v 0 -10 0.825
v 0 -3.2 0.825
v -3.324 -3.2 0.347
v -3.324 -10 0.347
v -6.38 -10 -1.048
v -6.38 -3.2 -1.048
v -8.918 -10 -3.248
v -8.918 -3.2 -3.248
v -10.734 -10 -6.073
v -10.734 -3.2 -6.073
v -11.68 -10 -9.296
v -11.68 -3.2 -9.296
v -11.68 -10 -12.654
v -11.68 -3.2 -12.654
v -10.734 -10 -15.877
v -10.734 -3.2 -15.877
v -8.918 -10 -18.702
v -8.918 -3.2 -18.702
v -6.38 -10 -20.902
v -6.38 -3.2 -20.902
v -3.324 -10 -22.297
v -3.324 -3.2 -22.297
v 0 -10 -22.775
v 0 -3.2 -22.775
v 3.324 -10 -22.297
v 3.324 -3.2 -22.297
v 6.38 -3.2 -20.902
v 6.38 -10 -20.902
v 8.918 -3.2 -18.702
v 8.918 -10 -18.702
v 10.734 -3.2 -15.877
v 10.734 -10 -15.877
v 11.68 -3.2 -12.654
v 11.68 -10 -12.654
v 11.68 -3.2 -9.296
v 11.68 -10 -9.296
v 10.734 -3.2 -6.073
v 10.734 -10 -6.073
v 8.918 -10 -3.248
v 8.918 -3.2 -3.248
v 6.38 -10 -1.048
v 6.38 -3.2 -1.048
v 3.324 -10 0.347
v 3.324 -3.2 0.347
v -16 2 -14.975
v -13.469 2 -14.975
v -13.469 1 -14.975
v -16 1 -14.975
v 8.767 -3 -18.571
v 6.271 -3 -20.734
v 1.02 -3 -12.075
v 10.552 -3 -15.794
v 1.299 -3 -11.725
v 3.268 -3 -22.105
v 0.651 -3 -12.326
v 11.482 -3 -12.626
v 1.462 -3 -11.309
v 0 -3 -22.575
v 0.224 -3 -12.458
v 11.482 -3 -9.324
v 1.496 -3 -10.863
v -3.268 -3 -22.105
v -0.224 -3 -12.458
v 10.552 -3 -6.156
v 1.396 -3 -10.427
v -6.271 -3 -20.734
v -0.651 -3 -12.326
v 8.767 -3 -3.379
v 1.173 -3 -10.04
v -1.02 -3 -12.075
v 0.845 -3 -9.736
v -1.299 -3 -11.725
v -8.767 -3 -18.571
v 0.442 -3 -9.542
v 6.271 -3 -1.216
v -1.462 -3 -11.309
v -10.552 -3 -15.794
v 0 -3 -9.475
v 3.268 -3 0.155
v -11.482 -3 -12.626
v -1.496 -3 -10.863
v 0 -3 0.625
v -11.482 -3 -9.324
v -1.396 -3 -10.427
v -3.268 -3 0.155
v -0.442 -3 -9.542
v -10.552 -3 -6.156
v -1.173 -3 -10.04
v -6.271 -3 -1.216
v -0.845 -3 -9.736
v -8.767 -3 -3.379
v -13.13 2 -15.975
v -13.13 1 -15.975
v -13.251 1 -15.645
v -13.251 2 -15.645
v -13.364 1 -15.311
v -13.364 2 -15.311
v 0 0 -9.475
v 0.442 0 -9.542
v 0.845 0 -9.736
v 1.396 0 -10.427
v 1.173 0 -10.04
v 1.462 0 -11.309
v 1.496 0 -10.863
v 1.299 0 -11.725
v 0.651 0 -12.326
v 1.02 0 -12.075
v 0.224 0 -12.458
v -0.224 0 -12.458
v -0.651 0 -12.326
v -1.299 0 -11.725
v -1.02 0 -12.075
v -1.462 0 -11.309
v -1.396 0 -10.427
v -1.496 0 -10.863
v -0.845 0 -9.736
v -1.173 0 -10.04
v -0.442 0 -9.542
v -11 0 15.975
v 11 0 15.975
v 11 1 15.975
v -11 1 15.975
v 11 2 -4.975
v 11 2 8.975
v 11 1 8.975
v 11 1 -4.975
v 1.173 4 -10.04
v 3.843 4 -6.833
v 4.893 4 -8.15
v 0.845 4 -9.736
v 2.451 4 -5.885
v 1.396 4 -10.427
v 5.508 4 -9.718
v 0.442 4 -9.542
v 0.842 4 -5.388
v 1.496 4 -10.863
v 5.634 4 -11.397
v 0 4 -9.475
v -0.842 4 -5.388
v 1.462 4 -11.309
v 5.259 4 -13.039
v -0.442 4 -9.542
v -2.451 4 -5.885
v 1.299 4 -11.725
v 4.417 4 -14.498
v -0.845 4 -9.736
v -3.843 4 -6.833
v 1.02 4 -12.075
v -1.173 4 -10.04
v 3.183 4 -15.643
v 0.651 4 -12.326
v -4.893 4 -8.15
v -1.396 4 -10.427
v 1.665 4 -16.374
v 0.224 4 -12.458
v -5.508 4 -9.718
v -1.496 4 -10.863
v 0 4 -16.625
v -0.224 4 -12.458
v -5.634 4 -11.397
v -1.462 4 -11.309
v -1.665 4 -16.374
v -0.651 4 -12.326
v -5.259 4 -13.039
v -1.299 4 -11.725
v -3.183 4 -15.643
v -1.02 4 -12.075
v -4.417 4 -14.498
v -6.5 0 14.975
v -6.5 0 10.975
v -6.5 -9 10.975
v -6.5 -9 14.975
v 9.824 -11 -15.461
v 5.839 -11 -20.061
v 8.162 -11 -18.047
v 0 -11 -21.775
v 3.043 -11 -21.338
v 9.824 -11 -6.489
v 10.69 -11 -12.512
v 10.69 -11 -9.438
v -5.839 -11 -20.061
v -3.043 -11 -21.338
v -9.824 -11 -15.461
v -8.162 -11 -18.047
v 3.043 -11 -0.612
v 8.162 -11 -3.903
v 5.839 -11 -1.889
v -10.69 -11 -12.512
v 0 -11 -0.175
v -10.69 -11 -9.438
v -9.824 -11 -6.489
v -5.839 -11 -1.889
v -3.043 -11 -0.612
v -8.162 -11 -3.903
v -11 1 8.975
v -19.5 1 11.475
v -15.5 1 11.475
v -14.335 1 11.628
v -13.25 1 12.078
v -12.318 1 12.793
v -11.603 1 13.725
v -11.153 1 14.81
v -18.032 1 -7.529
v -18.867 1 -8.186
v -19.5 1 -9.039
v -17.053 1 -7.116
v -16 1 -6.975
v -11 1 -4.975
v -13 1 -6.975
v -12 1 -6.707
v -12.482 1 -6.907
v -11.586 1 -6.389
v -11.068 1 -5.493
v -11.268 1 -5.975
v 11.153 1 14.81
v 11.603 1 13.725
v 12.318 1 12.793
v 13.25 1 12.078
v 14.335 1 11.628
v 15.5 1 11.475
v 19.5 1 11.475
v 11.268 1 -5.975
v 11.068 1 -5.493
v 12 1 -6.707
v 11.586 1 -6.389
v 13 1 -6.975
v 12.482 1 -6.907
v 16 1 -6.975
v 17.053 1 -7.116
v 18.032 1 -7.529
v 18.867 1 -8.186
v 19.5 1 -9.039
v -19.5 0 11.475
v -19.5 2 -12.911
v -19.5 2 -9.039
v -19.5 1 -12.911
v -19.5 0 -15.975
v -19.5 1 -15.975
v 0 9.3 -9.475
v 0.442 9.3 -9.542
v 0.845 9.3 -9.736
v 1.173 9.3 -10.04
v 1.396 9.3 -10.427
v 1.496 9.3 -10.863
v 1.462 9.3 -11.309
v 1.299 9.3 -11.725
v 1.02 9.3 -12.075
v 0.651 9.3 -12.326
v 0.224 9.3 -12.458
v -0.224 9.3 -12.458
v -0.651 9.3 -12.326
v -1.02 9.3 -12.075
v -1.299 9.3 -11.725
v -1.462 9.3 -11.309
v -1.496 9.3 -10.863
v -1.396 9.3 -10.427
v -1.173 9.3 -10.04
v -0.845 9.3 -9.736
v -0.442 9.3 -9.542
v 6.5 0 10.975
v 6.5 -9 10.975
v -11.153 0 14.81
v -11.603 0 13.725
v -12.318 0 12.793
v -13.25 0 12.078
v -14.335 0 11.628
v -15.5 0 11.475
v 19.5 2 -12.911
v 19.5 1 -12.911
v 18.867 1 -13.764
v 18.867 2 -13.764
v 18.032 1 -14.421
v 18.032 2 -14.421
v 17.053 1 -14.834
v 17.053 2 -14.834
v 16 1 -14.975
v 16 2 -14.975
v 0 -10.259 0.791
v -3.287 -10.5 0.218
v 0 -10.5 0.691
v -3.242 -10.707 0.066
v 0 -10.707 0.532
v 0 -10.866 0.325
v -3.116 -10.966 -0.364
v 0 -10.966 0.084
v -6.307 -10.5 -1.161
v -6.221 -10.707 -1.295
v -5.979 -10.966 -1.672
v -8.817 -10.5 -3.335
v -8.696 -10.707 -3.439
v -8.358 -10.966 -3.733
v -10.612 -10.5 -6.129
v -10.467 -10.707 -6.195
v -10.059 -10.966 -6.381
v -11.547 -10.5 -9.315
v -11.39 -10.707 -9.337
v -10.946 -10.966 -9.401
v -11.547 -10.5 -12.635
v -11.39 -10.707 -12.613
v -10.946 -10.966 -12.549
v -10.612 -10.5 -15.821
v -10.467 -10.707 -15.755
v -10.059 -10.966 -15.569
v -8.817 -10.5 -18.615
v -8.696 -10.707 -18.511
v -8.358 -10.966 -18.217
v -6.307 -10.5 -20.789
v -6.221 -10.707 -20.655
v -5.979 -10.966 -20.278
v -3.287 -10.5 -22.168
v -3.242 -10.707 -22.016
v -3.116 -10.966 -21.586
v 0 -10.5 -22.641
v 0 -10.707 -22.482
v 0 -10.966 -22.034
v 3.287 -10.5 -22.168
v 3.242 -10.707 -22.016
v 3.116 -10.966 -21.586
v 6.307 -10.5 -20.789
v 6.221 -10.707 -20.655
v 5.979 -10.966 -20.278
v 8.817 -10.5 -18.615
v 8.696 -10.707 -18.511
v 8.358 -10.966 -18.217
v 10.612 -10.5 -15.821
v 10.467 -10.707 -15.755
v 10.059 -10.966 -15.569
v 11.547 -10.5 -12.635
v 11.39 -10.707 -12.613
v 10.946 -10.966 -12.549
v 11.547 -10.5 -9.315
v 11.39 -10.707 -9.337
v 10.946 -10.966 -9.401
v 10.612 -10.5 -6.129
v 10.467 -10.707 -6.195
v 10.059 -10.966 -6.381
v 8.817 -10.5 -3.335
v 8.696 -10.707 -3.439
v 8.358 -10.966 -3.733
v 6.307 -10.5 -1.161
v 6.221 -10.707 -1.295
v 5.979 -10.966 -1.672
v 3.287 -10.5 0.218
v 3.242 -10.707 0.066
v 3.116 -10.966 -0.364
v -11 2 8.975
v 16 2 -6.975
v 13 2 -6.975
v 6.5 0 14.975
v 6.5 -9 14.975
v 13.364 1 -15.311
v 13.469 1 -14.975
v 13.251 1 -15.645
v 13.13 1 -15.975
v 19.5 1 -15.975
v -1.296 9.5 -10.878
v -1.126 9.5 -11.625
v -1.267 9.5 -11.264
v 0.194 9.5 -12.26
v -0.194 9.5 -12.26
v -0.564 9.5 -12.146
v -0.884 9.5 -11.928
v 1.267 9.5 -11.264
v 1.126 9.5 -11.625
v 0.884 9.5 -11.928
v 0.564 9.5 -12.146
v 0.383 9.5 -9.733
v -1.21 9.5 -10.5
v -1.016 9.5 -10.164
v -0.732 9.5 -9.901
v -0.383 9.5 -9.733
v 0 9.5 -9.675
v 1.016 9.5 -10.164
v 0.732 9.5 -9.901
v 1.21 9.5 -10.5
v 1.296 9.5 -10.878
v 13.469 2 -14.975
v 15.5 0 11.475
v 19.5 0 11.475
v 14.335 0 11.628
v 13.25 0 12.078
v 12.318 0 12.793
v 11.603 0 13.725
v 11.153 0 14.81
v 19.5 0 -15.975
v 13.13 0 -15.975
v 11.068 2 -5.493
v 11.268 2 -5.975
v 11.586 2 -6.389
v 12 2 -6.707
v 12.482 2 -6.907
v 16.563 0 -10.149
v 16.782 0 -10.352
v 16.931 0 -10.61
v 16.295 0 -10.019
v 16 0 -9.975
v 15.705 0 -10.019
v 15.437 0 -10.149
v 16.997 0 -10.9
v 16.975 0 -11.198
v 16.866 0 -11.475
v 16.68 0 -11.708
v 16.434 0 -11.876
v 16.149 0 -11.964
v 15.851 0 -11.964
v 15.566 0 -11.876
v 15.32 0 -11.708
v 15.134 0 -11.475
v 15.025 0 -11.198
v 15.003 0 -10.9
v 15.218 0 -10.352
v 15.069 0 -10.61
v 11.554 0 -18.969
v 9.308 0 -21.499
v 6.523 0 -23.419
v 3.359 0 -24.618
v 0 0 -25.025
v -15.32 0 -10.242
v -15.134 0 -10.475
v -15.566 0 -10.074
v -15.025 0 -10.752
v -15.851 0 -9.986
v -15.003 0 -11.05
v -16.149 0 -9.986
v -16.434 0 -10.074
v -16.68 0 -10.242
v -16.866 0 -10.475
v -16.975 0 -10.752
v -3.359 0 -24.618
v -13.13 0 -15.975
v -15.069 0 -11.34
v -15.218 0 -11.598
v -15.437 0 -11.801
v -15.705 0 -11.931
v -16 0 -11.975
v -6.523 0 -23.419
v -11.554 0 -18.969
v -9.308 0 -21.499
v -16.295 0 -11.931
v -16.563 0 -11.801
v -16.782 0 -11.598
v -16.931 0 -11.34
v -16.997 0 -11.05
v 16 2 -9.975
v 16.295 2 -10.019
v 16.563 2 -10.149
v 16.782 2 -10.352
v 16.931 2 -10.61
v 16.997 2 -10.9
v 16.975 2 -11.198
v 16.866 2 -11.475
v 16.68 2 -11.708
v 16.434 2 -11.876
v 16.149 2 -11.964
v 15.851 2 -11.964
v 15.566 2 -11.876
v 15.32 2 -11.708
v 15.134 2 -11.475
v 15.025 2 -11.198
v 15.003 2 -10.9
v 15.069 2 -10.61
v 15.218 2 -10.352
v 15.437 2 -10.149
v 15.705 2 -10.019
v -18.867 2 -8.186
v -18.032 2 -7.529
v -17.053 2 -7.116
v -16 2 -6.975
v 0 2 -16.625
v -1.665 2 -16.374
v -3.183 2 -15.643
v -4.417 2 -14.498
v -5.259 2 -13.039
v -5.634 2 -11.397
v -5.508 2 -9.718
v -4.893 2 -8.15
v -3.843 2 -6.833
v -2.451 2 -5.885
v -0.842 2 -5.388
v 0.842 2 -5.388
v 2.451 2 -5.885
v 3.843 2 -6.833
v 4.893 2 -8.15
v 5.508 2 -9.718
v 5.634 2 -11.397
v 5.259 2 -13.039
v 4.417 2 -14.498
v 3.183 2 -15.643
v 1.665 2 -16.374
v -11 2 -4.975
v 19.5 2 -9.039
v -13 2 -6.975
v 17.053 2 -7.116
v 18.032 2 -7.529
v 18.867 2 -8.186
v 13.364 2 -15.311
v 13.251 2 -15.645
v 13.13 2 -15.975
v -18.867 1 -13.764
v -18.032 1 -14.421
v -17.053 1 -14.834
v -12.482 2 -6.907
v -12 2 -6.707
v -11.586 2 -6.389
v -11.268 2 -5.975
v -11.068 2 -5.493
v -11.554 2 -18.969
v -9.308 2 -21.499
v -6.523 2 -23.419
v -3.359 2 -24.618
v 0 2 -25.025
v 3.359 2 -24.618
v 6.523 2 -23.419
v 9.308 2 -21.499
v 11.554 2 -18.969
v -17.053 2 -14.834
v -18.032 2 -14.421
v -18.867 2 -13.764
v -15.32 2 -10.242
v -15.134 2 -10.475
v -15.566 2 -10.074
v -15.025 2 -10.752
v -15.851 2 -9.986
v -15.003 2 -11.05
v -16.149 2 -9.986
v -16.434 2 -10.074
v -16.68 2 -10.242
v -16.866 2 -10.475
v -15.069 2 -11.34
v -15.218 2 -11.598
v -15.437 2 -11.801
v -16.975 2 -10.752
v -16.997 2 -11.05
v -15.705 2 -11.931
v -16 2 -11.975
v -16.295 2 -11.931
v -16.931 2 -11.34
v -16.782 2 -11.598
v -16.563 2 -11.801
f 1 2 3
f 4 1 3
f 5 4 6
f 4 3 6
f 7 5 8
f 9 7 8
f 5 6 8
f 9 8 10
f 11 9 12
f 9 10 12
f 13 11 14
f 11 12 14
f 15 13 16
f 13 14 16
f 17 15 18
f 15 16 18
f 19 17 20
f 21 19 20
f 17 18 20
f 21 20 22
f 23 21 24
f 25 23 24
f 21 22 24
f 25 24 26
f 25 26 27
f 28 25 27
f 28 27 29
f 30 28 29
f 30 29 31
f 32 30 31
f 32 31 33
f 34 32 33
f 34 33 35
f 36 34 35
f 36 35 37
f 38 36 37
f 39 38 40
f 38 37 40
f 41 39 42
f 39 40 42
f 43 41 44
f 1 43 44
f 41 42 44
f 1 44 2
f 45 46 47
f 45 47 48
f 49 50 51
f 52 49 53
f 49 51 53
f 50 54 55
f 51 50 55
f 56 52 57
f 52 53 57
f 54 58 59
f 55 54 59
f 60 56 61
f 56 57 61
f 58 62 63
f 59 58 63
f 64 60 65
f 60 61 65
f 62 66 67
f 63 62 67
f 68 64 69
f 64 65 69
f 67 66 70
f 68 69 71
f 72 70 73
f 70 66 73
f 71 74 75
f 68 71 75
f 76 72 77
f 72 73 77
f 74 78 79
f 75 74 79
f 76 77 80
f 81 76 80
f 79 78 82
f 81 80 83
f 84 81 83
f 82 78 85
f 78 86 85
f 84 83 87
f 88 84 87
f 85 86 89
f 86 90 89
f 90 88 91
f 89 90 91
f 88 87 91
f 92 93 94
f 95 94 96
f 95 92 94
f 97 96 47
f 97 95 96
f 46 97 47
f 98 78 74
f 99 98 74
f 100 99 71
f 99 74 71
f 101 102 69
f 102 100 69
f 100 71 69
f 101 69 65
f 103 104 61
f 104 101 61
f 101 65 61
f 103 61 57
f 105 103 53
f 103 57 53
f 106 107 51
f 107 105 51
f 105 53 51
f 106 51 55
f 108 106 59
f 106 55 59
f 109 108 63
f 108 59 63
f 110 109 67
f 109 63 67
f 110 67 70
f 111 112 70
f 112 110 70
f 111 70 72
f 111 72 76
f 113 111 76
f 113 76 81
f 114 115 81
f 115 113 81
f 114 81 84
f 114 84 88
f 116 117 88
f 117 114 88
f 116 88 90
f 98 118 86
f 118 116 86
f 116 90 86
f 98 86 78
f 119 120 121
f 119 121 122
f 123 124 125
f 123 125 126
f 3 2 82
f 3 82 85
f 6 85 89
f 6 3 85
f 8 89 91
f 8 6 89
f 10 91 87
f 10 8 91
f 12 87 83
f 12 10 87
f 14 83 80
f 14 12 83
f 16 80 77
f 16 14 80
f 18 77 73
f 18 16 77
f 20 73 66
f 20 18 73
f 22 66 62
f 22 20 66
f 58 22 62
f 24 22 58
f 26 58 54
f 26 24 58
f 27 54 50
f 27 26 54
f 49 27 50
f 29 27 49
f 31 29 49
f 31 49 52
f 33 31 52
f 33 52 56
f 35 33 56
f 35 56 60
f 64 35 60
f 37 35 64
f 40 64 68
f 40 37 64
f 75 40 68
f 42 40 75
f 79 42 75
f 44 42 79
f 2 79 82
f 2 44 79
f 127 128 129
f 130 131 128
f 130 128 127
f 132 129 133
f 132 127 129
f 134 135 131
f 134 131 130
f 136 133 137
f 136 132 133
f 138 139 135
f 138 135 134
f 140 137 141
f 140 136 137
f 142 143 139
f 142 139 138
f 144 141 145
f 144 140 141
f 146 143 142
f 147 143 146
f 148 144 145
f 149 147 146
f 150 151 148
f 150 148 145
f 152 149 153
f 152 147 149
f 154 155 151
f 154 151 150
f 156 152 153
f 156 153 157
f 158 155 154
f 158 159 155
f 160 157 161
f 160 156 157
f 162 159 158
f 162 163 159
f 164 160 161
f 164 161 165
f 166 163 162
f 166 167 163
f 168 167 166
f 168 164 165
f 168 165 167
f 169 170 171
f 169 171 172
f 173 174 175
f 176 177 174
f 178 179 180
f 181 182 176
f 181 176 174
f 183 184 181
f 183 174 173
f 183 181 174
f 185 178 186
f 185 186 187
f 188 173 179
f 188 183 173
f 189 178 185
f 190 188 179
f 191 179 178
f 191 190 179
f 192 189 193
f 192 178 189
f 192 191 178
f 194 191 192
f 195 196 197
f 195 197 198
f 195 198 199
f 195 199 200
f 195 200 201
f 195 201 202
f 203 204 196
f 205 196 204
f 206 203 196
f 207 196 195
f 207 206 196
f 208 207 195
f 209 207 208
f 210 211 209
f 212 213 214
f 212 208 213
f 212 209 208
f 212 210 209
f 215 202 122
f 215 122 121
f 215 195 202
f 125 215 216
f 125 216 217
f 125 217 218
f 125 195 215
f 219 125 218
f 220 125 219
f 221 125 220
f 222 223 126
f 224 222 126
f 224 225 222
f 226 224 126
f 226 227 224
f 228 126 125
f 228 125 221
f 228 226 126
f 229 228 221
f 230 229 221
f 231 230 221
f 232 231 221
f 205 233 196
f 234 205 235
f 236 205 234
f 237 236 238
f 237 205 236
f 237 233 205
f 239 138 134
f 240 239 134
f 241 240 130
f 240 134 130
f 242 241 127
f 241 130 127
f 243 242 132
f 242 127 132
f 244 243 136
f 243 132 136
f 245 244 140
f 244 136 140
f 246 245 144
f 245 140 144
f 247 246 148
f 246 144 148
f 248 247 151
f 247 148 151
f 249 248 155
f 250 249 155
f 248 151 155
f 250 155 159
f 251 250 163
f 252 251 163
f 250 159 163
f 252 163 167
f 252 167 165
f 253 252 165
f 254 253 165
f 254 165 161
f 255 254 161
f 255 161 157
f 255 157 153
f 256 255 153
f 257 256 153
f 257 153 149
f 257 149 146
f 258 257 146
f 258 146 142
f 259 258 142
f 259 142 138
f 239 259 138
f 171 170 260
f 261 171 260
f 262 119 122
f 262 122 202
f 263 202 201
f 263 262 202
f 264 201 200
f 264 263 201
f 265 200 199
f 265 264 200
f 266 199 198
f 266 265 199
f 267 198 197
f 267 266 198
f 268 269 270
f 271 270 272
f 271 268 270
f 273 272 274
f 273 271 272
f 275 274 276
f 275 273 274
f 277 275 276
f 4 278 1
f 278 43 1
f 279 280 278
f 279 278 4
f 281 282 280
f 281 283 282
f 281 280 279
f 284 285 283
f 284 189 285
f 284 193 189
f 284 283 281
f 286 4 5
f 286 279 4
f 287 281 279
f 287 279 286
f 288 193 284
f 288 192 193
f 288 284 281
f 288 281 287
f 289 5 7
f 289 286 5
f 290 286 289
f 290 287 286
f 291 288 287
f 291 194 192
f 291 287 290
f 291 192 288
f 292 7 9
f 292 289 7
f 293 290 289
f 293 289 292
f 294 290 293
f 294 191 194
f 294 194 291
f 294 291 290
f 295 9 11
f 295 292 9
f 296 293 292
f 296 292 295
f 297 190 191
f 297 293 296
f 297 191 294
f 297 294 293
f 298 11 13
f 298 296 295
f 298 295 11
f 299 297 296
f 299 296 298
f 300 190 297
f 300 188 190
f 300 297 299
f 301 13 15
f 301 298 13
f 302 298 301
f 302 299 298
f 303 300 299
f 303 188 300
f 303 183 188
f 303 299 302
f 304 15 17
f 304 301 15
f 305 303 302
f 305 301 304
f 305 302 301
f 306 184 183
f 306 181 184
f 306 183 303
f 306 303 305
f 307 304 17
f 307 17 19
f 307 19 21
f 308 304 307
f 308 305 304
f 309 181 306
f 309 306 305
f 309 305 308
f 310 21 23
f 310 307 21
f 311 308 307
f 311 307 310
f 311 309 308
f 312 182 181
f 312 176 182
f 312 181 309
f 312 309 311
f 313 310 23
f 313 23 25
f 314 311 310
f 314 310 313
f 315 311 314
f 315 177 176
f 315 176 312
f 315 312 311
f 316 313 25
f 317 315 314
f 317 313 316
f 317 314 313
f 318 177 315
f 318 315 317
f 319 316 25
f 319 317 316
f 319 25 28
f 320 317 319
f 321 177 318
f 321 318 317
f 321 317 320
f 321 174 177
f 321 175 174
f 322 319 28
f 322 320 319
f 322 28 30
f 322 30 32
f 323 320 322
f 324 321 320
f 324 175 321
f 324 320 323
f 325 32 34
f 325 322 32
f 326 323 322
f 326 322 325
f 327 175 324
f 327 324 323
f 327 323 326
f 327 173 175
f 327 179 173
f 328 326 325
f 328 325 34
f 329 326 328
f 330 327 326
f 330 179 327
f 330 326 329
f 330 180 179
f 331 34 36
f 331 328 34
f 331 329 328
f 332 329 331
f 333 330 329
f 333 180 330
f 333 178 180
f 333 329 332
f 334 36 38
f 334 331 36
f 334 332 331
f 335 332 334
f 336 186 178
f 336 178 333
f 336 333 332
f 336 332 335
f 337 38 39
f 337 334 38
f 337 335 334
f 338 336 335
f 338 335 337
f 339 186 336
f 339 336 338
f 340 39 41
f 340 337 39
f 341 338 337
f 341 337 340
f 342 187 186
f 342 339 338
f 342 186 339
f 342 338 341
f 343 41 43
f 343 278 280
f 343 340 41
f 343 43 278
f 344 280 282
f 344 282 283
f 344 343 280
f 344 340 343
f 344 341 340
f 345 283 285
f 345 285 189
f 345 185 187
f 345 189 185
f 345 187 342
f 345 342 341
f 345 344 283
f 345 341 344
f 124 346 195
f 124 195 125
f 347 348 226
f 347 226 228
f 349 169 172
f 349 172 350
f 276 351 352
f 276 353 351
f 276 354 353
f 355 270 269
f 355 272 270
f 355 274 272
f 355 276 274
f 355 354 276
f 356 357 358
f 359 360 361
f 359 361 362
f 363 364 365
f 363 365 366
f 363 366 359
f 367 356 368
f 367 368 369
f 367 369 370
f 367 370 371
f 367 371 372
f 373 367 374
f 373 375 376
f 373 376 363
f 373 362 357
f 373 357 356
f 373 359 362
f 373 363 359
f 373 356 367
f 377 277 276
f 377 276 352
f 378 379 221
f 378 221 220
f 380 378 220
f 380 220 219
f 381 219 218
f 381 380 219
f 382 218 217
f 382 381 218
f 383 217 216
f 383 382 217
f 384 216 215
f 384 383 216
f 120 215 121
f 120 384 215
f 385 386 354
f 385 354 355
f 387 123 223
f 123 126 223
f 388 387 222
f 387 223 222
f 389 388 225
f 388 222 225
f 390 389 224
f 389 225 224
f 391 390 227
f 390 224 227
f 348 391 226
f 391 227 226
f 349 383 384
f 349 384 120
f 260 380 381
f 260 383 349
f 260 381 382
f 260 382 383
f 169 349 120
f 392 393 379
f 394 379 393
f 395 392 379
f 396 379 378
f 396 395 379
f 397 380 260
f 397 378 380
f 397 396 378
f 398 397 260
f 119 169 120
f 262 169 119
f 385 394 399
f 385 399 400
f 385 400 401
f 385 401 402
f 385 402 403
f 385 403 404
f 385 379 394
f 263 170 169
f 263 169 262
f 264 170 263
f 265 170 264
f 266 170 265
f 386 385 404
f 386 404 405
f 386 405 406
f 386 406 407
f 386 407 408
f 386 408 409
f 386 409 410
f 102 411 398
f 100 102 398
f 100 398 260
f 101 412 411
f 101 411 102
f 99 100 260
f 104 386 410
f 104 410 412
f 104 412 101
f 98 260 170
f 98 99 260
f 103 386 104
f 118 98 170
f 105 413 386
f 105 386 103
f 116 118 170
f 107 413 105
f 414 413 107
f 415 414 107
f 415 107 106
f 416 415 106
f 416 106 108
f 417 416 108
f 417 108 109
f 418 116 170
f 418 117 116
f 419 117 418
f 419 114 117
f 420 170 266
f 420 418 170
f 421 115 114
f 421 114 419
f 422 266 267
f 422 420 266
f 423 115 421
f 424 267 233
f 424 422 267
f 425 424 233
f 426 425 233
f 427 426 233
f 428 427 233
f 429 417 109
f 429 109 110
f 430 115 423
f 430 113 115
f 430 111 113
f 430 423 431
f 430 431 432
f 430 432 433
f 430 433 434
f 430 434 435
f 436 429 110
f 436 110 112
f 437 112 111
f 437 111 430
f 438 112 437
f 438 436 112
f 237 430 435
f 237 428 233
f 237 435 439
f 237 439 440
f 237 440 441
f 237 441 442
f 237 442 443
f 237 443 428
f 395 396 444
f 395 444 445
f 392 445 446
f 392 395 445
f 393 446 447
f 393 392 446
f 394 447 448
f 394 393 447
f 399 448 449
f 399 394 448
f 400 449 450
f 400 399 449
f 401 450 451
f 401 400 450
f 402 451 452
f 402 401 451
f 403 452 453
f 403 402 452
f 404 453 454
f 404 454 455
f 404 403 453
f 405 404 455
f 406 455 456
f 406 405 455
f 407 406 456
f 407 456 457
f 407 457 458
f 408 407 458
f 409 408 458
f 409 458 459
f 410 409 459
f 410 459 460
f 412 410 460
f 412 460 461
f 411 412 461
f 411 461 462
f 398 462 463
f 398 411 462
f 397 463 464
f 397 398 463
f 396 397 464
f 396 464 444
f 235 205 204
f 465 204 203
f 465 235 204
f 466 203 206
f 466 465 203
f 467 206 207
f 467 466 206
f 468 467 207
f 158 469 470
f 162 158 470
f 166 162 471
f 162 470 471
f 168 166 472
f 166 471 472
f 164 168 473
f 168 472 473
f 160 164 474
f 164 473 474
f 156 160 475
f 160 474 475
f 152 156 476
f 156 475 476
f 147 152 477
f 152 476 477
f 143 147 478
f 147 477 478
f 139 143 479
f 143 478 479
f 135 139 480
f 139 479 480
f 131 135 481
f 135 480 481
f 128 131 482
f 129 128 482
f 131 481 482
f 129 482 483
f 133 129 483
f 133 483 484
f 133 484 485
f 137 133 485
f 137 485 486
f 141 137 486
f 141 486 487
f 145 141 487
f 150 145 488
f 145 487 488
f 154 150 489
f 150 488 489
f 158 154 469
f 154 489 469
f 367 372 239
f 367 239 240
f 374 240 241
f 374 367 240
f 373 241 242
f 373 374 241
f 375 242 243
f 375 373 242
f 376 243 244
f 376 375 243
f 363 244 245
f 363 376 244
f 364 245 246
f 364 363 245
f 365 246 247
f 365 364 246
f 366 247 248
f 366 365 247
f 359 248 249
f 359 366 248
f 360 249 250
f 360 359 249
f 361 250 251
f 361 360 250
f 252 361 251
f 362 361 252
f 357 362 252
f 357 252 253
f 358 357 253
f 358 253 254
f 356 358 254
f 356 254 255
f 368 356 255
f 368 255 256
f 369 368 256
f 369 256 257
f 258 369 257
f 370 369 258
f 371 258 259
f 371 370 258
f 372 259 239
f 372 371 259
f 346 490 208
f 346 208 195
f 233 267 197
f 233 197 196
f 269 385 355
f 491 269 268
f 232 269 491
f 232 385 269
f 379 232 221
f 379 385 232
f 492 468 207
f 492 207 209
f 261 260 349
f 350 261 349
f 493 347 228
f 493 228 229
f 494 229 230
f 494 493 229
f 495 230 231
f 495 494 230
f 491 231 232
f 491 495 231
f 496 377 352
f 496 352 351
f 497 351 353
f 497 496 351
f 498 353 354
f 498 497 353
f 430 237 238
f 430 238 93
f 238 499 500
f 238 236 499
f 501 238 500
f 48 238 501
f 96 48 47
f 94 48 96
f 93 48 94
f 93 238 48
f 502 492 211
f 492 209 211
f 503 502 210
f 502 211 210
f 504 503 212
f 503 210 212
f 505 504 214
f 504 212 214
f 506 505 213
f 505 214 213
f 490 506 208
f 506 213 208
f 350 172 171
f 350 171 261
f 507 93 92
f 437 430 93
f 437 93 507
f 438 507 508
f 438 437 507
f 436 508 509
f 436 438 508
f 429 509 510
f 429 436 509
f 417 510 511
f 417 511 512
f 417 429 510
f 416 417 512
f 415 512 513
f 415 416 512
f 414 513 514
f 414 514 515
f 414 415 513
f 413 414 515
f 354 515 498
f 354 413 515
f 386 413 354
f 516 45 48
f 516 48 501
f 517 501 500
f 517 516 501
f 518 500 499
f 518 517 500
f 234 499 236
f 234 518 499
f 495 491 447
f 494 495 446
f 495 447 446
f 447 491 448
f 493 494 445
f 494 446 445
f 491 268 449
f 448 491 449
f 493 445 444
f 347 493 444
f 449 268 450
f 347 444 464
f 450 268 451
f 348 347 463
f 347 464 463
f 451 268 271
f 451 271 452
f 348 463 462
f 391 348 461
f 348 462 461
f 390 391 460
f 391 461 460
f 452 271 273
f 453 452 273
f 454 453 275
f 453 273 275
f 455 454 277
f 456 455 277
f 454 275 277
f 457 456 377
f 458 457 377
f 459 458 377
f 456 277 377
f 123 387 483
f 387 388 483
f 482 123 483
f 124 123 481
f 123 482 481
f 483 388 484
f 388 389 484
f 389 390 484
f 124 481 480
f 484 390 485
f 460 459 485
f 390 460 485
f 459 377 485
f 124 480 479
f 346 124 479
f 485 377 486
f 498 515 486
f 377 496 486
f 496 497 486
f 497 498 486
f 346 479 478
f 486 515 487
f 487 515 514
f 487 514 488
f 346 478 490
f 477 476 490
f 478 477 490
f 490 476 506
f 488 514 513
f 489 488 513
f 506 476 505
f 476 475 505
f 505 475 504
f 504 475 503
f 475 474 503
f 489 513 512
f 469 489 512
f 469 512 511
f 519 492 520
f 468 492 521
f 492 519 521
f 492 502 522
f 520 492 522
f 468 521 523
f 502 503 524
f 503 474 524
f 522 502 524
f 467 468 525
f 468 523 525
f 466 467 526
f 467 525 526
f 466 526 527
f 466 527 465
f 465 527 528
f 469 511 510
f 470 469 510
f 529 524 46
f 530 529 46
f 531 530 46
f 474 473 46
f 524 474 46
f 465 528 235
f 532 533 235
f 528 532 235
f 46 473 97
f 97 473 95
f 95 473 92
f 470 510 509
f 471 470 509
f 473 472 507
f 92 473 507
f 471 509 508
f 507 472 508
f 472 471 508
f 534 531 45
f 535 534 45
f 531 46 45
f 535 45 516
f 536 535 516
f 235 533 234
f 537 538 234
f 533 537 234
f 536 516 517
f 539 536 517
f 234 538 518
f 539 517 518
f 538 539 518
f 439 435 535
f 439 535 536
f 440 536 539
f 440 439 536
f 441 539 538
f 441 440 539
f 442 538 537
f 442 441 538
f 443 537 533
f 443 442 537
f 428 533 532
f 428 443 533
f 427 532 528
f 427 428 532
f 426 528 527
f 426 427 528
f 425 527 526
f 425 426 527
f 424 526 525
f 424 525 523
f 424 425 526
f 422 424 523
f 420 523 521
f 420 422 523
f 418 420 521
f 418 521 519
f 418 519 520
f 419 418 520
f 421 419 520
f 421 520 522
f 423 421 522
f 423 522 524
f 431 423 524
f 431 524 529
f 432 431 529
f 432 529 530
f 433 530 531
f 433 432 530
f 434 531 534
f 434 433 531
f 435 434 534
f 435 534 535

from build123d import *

# Parameters (mm, degrees)
SKETCH_1_R           = 1
EXTRUDE_1_DEPTH      = 2
SKETCH_2_R           = 5.65
EXTRUDE_2_DEPTH      = 2
EXTRUDE_3_DEPTH      = 5.5
EXTRUDE_3_DEPTH_BACK = 15
SKETCH_3_R           = 1.5
SKETCH_4_W           = 11.8
SKETCH_4_H           = 8
FILLET_1_R           = 1
SKETCH_5_OUTSIDE_W   = 53.038
SKETCH_5_OUTSIDE_H   = 55.038
CUT_EXTRUDE_4_DEPTH  = 1
FILLET_2_R           = 2
CHAMFER_1_SIZE       = 0.2
SKETCH_6_W           = 13
SKETCH_6_H           = 4
EXTRUDE_4_DEPTH      = 9


with BuildPart() as part:
    # 草图1 → 凸台-拉伸1 (new body)
    with BuildSketch(Plane(origin=(0, 0, 0), x_dir=(1, 0, 0), z_dir=(0, 1, 0))):
        with BuildLine():
            Line((-19.5, 15.975), (-13.13021325, 15.975))
            ThreePointArc((-13.13021325, 15.975), (0, 25.025), (13.13021325, 15.975))
            Line((13.13021325, 15.975), (19.5, 15.975))
            Line((19.5, 15.975), (19.5, -11.475))
            Line((19.5, -11.475), (15.5, -11.475))
            ThreePointArc((15.5, -11.475), (12.318019485, -12.793019485), (11, -15.975))
            Line((11, -15.975), (-11, -15.975))
            ThreePointArc((-11, -15.975), (-12.318019485, -12.793019485), (-15.5, -11.475))
            Line((-15.5, -11.475), (-19.5, -11.475))
            Line((-19.5, -11.475), (-19.5, 15.975))
        make_face()
        with Locations(Location((16, 10.975, 0), (0, 0, 270))):
            Circle(SKETCH_1_R, mode=Mode.SUBTRACT)
        with Locations(Location((-16, 10.975, 0), (0, 0, 90))):
            Circle(SKETCH_1_R, mode=Mode.SUBTRACT)
    extrude(amount=EXTRUDE_1_DEPTH)

    # 草图2 → 凸台-拉伸2 (add)
    with BuildSketch(Plane(origin=(0, 2, 0), x_dir=(1, 0, 0), z_dir=(0, 1, 0))):
        with Locations(Location((0, 10.975, 0), (0, 0, 90))):
            Circle(SKETCH_2_R)
    extrude(amount=EXTRUDE_2_DEPTH)

    # 草图3 → 凸台-拉伸3 (add, two sides: drawn at the far end of the back side and taken through both)
    with BuildSketch(Plane(origin=(0, 4, 0), x_dir=(1, 0, 0), z_dir=(0, 1, 0)).offset(-EXTRUDE_3_DEPTH_BACK)):
        with Locations(Location((0, 10.975, 0), (0, 0, 270))):
            Circle(SKETCH_3_R)
    extrude(amount=EXTRUDE_3_DEPTH + EXTRUDE_3_DEPTH_BACK)

    # 草图4 → 旋转1 (revolve)
    with BuildSketch(Plane(origin=(0, 0, 0), x_dir=(0, 0, -1), z_dir=(1, 0, 0))):
        with Locations((5.075, -7)):
            Rectangle(SKETCH_4_W, SKETCH_4_H)
    revolve(axis=Axis((0, 9.5, -10.975), (0, -1, 0)))

    # 圆角1
    fillet_1_edges = [part.edges().sort_by_distance(p)[0] for p in [
        (0, -11, -22.775),
    ]]
    fillet(fillet_1_edges, radius=FILLET_1_R)

    # 草图5 outside → 切除-拉伸4 (cut)
    with BuildSketch(Plane(origin=(0, 2, 0), x_dir=(1, 0, 0), z_dir=(0, 1, 0))):
        with Locations((0, 4.525)):
            Rectangle(SKETCH_5_OUTSIDE_W, SKETCH_5_OUTSIDE_H)
        with BuildLine():
            Line((-11, -8.975), (11, -8.975))
            Line((11, -8.975), (11, 6.975))
            Line((11, 6.975), (16, 6.975))
            ThreePointArc((16, 6.975), (20, 10.975), (16, 14.975))
            Line((16, 14.975), (13.468574535, 14.975))
            ThreePointArc((13.468574535, 14.975), (0, 25.025), (-13.468574535, 14.975))
            Line((-13.468574535, 14.975), (-16, 14.975))
            ThreePointArc((-16, 14.975), (-20, 10.975), (-16, 6.975))
            Line((-16, 6.975), (-11, 6.975))
            Line((-11, 6.975), (-11, -8.975))
        make_face(mode=Mode.SUBTRACT)
    extrude(amount=-CUT_EXTRUDE_4_DEPTH, mode=Mode.SUBTRACT)

    # 圆角2
    fillet_2_edges = [part.edges().sort_by_distance(p)[0] for p in [
        (-11, 1.5, -6.975),
        (11, 1.5, -6.975),
    ]]
    fillet(fillet_2_edges, radius=FILLET_2_R)

    # 倒角1
    chamfer_1_edges = [part.edges().sort_by_distance(p)[0] for p in [
        (0, 9.5, -12.475),
        (0, -3, -22.775),
    ]]
    chamfer(chamfer_1_edges, length=CHAMFER_1_SIZE)

    # 草图6 → 凸台-拉伸4 (add)
    with BuildSketch(Plane.XZ):
        with Locations((0, 12.975)):
            Rectangle(SKETCH_6_W, SKETCH_6_H)
    extrude(amount=EXTRUDE_4_DEPTH)


solid = part.part
